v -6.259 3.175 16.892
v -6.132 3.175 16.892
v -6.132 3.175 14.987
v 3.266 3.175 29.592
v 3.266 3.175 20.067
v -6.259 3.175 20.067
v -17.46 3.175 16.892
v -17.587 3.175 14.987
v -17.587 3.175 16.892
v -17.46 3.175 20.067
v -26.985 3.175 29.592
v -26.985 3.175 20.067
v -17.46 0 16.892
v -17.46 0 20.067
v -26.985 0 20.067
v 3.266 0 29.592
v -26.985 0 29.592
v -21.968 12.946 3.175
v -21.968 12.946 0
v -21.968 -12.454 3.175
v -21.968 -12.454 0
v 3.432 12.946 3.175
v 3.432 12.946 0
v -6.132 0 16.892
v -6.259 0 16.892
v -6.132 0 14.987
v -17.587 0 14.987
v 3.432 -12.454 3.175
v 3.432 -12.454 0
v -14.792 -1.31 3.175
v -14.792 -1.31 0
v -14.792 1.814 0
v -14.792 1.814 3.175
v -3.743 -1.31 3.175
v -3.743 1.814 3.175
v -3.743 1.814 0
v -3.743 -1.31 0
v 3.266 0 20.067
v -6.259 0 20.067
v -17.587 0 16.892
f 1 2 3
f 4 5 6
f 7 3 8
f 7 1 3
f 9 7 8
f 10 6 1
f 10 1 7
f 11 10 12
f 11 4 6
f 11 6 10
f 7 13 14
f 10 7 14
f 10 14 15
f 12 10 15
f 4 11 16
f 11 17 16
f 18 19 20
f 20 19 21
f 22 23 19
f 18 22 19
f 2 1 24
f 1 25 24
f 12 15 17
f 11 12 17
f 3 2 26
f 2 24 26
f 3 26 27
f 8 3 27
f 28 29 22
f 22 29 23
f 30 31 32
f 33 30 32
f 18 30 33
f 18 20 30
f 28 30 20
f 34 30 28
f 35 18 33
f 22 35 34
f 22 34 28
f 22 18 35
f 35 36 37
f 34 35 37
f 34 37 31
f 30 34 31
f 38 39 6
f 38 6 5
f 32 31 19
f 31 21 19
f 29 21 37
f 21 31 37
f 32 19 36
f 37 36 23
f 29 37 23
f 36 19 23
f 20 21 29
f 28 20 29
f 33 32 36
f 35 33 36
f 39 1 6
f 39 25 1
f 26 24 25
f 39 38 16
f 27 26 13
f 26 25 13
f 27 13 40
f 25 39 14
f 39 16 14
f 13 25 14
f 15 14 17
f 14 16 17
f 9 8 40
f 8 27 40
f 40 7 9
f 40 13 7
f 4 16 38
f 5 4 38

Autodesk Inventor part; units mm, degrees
ref_plane "YZ Plane" through (0, 0, 0) normal (1, 0, 0) x (0, 1, 0)
ref_plane "XZ Plane" through (0, 0, 0) normal (0, 1, 0) x (-1, 0, 0)
ref_plane "XY Plane" through (0, 0, 0) normal (0, 0, 1) x (1, 0, 0)
sketch "Sketch1" plane through (0, 0, 0) normal (0, 0, 1) x (1, 0, 0)
  line L0 (-14.792, -1.3102) -> (-14.792, 1.814)
  line L1 (-14.792, 1.814) -> (-3.743, 1.814)
  line L2 (-3.743, 1.814) -> (-3.743, -1.3102)
  line L3 (-3.743, -1.3102) -> (-14.792, -1.3102)
  line L4 (-21.9675, -12.4544) -> (3.4325, -12.4544)
  line L5 (3.4325, -12.4544) -> (3.4325, 12.9456)
  line L6 (3.4325, 12.9456) -> (-21.9675, 12.9456)
  line L7 (-21.9675, 12.9456) -> (-21.9675, -12.4544)
  line L8 (-21.9675, -12.4544) -> (3.4325, 12.9456) construction
  line L9 (3.4325, -12.4544) -> (-21.9675, 12.9456) construction
  point P0 (0, 0)
  point P1 (-9.2675, 0.2456)
  dimension "d0" = 3.1242
  dimension "d2" = 11.049
  dimension "d3" = 25.4
  dimension "d4" = 25.4
extrude "Extrusion1" add sketch "Sketch1" along normal blind 3.175
sketch "Sketch2" plane through (0, 0, 0) normal (0, 1, 0) x (-1, 0, 0)
  line L0 (17.4601, 16.8923) -> (17.4601, 20.0673)
  line L1 (6.2587, 16.8923) -> (6.2587, 20.0673)
  line L2 (6.2587, 20.0673) -> (-3.2663, 20.0673)
  line L3 (17.4601, 20.0673) -> (26.9851, 20.0673)
  line L4 (26.9851, 20.0673) -> (26.9851, 29.5923)
  line L5 (26.9851, 29.5923) -> (-3.2663, 29.5923)
  line L6 (-3.2663, 29.5923) -> (-3.2663, 20.0673)
  line L7 (17.4601, 16.8923) -> (17.5871, 16.8923)
  line L8 (6.2587, 16.8923) -> (6.1317, 16.8923)
  line L9 (6.1317, 16.8923) -> (6.1317, 14.9873)
  line L10 (6.1317, 14.9873) -> (17.5871, 14.9873)
  line L11 (17.5871, 14.9873) -> (17.5871, 16.8923)
  point P0 (0, 0)
  dimension "d10" = 9.525
  dimension "d11" = 9.525
  dimension "d12" = 9.525
  dimension "d14" = 0.127
  dimension "d15" = 0.127
  dimension "d16" = 1.905
  dimension "d19" = 11.2014
  dimension "d20" = 11.4554
extrude "Extrusion2" add sketch "Sketch2" along normal blind 3.175
